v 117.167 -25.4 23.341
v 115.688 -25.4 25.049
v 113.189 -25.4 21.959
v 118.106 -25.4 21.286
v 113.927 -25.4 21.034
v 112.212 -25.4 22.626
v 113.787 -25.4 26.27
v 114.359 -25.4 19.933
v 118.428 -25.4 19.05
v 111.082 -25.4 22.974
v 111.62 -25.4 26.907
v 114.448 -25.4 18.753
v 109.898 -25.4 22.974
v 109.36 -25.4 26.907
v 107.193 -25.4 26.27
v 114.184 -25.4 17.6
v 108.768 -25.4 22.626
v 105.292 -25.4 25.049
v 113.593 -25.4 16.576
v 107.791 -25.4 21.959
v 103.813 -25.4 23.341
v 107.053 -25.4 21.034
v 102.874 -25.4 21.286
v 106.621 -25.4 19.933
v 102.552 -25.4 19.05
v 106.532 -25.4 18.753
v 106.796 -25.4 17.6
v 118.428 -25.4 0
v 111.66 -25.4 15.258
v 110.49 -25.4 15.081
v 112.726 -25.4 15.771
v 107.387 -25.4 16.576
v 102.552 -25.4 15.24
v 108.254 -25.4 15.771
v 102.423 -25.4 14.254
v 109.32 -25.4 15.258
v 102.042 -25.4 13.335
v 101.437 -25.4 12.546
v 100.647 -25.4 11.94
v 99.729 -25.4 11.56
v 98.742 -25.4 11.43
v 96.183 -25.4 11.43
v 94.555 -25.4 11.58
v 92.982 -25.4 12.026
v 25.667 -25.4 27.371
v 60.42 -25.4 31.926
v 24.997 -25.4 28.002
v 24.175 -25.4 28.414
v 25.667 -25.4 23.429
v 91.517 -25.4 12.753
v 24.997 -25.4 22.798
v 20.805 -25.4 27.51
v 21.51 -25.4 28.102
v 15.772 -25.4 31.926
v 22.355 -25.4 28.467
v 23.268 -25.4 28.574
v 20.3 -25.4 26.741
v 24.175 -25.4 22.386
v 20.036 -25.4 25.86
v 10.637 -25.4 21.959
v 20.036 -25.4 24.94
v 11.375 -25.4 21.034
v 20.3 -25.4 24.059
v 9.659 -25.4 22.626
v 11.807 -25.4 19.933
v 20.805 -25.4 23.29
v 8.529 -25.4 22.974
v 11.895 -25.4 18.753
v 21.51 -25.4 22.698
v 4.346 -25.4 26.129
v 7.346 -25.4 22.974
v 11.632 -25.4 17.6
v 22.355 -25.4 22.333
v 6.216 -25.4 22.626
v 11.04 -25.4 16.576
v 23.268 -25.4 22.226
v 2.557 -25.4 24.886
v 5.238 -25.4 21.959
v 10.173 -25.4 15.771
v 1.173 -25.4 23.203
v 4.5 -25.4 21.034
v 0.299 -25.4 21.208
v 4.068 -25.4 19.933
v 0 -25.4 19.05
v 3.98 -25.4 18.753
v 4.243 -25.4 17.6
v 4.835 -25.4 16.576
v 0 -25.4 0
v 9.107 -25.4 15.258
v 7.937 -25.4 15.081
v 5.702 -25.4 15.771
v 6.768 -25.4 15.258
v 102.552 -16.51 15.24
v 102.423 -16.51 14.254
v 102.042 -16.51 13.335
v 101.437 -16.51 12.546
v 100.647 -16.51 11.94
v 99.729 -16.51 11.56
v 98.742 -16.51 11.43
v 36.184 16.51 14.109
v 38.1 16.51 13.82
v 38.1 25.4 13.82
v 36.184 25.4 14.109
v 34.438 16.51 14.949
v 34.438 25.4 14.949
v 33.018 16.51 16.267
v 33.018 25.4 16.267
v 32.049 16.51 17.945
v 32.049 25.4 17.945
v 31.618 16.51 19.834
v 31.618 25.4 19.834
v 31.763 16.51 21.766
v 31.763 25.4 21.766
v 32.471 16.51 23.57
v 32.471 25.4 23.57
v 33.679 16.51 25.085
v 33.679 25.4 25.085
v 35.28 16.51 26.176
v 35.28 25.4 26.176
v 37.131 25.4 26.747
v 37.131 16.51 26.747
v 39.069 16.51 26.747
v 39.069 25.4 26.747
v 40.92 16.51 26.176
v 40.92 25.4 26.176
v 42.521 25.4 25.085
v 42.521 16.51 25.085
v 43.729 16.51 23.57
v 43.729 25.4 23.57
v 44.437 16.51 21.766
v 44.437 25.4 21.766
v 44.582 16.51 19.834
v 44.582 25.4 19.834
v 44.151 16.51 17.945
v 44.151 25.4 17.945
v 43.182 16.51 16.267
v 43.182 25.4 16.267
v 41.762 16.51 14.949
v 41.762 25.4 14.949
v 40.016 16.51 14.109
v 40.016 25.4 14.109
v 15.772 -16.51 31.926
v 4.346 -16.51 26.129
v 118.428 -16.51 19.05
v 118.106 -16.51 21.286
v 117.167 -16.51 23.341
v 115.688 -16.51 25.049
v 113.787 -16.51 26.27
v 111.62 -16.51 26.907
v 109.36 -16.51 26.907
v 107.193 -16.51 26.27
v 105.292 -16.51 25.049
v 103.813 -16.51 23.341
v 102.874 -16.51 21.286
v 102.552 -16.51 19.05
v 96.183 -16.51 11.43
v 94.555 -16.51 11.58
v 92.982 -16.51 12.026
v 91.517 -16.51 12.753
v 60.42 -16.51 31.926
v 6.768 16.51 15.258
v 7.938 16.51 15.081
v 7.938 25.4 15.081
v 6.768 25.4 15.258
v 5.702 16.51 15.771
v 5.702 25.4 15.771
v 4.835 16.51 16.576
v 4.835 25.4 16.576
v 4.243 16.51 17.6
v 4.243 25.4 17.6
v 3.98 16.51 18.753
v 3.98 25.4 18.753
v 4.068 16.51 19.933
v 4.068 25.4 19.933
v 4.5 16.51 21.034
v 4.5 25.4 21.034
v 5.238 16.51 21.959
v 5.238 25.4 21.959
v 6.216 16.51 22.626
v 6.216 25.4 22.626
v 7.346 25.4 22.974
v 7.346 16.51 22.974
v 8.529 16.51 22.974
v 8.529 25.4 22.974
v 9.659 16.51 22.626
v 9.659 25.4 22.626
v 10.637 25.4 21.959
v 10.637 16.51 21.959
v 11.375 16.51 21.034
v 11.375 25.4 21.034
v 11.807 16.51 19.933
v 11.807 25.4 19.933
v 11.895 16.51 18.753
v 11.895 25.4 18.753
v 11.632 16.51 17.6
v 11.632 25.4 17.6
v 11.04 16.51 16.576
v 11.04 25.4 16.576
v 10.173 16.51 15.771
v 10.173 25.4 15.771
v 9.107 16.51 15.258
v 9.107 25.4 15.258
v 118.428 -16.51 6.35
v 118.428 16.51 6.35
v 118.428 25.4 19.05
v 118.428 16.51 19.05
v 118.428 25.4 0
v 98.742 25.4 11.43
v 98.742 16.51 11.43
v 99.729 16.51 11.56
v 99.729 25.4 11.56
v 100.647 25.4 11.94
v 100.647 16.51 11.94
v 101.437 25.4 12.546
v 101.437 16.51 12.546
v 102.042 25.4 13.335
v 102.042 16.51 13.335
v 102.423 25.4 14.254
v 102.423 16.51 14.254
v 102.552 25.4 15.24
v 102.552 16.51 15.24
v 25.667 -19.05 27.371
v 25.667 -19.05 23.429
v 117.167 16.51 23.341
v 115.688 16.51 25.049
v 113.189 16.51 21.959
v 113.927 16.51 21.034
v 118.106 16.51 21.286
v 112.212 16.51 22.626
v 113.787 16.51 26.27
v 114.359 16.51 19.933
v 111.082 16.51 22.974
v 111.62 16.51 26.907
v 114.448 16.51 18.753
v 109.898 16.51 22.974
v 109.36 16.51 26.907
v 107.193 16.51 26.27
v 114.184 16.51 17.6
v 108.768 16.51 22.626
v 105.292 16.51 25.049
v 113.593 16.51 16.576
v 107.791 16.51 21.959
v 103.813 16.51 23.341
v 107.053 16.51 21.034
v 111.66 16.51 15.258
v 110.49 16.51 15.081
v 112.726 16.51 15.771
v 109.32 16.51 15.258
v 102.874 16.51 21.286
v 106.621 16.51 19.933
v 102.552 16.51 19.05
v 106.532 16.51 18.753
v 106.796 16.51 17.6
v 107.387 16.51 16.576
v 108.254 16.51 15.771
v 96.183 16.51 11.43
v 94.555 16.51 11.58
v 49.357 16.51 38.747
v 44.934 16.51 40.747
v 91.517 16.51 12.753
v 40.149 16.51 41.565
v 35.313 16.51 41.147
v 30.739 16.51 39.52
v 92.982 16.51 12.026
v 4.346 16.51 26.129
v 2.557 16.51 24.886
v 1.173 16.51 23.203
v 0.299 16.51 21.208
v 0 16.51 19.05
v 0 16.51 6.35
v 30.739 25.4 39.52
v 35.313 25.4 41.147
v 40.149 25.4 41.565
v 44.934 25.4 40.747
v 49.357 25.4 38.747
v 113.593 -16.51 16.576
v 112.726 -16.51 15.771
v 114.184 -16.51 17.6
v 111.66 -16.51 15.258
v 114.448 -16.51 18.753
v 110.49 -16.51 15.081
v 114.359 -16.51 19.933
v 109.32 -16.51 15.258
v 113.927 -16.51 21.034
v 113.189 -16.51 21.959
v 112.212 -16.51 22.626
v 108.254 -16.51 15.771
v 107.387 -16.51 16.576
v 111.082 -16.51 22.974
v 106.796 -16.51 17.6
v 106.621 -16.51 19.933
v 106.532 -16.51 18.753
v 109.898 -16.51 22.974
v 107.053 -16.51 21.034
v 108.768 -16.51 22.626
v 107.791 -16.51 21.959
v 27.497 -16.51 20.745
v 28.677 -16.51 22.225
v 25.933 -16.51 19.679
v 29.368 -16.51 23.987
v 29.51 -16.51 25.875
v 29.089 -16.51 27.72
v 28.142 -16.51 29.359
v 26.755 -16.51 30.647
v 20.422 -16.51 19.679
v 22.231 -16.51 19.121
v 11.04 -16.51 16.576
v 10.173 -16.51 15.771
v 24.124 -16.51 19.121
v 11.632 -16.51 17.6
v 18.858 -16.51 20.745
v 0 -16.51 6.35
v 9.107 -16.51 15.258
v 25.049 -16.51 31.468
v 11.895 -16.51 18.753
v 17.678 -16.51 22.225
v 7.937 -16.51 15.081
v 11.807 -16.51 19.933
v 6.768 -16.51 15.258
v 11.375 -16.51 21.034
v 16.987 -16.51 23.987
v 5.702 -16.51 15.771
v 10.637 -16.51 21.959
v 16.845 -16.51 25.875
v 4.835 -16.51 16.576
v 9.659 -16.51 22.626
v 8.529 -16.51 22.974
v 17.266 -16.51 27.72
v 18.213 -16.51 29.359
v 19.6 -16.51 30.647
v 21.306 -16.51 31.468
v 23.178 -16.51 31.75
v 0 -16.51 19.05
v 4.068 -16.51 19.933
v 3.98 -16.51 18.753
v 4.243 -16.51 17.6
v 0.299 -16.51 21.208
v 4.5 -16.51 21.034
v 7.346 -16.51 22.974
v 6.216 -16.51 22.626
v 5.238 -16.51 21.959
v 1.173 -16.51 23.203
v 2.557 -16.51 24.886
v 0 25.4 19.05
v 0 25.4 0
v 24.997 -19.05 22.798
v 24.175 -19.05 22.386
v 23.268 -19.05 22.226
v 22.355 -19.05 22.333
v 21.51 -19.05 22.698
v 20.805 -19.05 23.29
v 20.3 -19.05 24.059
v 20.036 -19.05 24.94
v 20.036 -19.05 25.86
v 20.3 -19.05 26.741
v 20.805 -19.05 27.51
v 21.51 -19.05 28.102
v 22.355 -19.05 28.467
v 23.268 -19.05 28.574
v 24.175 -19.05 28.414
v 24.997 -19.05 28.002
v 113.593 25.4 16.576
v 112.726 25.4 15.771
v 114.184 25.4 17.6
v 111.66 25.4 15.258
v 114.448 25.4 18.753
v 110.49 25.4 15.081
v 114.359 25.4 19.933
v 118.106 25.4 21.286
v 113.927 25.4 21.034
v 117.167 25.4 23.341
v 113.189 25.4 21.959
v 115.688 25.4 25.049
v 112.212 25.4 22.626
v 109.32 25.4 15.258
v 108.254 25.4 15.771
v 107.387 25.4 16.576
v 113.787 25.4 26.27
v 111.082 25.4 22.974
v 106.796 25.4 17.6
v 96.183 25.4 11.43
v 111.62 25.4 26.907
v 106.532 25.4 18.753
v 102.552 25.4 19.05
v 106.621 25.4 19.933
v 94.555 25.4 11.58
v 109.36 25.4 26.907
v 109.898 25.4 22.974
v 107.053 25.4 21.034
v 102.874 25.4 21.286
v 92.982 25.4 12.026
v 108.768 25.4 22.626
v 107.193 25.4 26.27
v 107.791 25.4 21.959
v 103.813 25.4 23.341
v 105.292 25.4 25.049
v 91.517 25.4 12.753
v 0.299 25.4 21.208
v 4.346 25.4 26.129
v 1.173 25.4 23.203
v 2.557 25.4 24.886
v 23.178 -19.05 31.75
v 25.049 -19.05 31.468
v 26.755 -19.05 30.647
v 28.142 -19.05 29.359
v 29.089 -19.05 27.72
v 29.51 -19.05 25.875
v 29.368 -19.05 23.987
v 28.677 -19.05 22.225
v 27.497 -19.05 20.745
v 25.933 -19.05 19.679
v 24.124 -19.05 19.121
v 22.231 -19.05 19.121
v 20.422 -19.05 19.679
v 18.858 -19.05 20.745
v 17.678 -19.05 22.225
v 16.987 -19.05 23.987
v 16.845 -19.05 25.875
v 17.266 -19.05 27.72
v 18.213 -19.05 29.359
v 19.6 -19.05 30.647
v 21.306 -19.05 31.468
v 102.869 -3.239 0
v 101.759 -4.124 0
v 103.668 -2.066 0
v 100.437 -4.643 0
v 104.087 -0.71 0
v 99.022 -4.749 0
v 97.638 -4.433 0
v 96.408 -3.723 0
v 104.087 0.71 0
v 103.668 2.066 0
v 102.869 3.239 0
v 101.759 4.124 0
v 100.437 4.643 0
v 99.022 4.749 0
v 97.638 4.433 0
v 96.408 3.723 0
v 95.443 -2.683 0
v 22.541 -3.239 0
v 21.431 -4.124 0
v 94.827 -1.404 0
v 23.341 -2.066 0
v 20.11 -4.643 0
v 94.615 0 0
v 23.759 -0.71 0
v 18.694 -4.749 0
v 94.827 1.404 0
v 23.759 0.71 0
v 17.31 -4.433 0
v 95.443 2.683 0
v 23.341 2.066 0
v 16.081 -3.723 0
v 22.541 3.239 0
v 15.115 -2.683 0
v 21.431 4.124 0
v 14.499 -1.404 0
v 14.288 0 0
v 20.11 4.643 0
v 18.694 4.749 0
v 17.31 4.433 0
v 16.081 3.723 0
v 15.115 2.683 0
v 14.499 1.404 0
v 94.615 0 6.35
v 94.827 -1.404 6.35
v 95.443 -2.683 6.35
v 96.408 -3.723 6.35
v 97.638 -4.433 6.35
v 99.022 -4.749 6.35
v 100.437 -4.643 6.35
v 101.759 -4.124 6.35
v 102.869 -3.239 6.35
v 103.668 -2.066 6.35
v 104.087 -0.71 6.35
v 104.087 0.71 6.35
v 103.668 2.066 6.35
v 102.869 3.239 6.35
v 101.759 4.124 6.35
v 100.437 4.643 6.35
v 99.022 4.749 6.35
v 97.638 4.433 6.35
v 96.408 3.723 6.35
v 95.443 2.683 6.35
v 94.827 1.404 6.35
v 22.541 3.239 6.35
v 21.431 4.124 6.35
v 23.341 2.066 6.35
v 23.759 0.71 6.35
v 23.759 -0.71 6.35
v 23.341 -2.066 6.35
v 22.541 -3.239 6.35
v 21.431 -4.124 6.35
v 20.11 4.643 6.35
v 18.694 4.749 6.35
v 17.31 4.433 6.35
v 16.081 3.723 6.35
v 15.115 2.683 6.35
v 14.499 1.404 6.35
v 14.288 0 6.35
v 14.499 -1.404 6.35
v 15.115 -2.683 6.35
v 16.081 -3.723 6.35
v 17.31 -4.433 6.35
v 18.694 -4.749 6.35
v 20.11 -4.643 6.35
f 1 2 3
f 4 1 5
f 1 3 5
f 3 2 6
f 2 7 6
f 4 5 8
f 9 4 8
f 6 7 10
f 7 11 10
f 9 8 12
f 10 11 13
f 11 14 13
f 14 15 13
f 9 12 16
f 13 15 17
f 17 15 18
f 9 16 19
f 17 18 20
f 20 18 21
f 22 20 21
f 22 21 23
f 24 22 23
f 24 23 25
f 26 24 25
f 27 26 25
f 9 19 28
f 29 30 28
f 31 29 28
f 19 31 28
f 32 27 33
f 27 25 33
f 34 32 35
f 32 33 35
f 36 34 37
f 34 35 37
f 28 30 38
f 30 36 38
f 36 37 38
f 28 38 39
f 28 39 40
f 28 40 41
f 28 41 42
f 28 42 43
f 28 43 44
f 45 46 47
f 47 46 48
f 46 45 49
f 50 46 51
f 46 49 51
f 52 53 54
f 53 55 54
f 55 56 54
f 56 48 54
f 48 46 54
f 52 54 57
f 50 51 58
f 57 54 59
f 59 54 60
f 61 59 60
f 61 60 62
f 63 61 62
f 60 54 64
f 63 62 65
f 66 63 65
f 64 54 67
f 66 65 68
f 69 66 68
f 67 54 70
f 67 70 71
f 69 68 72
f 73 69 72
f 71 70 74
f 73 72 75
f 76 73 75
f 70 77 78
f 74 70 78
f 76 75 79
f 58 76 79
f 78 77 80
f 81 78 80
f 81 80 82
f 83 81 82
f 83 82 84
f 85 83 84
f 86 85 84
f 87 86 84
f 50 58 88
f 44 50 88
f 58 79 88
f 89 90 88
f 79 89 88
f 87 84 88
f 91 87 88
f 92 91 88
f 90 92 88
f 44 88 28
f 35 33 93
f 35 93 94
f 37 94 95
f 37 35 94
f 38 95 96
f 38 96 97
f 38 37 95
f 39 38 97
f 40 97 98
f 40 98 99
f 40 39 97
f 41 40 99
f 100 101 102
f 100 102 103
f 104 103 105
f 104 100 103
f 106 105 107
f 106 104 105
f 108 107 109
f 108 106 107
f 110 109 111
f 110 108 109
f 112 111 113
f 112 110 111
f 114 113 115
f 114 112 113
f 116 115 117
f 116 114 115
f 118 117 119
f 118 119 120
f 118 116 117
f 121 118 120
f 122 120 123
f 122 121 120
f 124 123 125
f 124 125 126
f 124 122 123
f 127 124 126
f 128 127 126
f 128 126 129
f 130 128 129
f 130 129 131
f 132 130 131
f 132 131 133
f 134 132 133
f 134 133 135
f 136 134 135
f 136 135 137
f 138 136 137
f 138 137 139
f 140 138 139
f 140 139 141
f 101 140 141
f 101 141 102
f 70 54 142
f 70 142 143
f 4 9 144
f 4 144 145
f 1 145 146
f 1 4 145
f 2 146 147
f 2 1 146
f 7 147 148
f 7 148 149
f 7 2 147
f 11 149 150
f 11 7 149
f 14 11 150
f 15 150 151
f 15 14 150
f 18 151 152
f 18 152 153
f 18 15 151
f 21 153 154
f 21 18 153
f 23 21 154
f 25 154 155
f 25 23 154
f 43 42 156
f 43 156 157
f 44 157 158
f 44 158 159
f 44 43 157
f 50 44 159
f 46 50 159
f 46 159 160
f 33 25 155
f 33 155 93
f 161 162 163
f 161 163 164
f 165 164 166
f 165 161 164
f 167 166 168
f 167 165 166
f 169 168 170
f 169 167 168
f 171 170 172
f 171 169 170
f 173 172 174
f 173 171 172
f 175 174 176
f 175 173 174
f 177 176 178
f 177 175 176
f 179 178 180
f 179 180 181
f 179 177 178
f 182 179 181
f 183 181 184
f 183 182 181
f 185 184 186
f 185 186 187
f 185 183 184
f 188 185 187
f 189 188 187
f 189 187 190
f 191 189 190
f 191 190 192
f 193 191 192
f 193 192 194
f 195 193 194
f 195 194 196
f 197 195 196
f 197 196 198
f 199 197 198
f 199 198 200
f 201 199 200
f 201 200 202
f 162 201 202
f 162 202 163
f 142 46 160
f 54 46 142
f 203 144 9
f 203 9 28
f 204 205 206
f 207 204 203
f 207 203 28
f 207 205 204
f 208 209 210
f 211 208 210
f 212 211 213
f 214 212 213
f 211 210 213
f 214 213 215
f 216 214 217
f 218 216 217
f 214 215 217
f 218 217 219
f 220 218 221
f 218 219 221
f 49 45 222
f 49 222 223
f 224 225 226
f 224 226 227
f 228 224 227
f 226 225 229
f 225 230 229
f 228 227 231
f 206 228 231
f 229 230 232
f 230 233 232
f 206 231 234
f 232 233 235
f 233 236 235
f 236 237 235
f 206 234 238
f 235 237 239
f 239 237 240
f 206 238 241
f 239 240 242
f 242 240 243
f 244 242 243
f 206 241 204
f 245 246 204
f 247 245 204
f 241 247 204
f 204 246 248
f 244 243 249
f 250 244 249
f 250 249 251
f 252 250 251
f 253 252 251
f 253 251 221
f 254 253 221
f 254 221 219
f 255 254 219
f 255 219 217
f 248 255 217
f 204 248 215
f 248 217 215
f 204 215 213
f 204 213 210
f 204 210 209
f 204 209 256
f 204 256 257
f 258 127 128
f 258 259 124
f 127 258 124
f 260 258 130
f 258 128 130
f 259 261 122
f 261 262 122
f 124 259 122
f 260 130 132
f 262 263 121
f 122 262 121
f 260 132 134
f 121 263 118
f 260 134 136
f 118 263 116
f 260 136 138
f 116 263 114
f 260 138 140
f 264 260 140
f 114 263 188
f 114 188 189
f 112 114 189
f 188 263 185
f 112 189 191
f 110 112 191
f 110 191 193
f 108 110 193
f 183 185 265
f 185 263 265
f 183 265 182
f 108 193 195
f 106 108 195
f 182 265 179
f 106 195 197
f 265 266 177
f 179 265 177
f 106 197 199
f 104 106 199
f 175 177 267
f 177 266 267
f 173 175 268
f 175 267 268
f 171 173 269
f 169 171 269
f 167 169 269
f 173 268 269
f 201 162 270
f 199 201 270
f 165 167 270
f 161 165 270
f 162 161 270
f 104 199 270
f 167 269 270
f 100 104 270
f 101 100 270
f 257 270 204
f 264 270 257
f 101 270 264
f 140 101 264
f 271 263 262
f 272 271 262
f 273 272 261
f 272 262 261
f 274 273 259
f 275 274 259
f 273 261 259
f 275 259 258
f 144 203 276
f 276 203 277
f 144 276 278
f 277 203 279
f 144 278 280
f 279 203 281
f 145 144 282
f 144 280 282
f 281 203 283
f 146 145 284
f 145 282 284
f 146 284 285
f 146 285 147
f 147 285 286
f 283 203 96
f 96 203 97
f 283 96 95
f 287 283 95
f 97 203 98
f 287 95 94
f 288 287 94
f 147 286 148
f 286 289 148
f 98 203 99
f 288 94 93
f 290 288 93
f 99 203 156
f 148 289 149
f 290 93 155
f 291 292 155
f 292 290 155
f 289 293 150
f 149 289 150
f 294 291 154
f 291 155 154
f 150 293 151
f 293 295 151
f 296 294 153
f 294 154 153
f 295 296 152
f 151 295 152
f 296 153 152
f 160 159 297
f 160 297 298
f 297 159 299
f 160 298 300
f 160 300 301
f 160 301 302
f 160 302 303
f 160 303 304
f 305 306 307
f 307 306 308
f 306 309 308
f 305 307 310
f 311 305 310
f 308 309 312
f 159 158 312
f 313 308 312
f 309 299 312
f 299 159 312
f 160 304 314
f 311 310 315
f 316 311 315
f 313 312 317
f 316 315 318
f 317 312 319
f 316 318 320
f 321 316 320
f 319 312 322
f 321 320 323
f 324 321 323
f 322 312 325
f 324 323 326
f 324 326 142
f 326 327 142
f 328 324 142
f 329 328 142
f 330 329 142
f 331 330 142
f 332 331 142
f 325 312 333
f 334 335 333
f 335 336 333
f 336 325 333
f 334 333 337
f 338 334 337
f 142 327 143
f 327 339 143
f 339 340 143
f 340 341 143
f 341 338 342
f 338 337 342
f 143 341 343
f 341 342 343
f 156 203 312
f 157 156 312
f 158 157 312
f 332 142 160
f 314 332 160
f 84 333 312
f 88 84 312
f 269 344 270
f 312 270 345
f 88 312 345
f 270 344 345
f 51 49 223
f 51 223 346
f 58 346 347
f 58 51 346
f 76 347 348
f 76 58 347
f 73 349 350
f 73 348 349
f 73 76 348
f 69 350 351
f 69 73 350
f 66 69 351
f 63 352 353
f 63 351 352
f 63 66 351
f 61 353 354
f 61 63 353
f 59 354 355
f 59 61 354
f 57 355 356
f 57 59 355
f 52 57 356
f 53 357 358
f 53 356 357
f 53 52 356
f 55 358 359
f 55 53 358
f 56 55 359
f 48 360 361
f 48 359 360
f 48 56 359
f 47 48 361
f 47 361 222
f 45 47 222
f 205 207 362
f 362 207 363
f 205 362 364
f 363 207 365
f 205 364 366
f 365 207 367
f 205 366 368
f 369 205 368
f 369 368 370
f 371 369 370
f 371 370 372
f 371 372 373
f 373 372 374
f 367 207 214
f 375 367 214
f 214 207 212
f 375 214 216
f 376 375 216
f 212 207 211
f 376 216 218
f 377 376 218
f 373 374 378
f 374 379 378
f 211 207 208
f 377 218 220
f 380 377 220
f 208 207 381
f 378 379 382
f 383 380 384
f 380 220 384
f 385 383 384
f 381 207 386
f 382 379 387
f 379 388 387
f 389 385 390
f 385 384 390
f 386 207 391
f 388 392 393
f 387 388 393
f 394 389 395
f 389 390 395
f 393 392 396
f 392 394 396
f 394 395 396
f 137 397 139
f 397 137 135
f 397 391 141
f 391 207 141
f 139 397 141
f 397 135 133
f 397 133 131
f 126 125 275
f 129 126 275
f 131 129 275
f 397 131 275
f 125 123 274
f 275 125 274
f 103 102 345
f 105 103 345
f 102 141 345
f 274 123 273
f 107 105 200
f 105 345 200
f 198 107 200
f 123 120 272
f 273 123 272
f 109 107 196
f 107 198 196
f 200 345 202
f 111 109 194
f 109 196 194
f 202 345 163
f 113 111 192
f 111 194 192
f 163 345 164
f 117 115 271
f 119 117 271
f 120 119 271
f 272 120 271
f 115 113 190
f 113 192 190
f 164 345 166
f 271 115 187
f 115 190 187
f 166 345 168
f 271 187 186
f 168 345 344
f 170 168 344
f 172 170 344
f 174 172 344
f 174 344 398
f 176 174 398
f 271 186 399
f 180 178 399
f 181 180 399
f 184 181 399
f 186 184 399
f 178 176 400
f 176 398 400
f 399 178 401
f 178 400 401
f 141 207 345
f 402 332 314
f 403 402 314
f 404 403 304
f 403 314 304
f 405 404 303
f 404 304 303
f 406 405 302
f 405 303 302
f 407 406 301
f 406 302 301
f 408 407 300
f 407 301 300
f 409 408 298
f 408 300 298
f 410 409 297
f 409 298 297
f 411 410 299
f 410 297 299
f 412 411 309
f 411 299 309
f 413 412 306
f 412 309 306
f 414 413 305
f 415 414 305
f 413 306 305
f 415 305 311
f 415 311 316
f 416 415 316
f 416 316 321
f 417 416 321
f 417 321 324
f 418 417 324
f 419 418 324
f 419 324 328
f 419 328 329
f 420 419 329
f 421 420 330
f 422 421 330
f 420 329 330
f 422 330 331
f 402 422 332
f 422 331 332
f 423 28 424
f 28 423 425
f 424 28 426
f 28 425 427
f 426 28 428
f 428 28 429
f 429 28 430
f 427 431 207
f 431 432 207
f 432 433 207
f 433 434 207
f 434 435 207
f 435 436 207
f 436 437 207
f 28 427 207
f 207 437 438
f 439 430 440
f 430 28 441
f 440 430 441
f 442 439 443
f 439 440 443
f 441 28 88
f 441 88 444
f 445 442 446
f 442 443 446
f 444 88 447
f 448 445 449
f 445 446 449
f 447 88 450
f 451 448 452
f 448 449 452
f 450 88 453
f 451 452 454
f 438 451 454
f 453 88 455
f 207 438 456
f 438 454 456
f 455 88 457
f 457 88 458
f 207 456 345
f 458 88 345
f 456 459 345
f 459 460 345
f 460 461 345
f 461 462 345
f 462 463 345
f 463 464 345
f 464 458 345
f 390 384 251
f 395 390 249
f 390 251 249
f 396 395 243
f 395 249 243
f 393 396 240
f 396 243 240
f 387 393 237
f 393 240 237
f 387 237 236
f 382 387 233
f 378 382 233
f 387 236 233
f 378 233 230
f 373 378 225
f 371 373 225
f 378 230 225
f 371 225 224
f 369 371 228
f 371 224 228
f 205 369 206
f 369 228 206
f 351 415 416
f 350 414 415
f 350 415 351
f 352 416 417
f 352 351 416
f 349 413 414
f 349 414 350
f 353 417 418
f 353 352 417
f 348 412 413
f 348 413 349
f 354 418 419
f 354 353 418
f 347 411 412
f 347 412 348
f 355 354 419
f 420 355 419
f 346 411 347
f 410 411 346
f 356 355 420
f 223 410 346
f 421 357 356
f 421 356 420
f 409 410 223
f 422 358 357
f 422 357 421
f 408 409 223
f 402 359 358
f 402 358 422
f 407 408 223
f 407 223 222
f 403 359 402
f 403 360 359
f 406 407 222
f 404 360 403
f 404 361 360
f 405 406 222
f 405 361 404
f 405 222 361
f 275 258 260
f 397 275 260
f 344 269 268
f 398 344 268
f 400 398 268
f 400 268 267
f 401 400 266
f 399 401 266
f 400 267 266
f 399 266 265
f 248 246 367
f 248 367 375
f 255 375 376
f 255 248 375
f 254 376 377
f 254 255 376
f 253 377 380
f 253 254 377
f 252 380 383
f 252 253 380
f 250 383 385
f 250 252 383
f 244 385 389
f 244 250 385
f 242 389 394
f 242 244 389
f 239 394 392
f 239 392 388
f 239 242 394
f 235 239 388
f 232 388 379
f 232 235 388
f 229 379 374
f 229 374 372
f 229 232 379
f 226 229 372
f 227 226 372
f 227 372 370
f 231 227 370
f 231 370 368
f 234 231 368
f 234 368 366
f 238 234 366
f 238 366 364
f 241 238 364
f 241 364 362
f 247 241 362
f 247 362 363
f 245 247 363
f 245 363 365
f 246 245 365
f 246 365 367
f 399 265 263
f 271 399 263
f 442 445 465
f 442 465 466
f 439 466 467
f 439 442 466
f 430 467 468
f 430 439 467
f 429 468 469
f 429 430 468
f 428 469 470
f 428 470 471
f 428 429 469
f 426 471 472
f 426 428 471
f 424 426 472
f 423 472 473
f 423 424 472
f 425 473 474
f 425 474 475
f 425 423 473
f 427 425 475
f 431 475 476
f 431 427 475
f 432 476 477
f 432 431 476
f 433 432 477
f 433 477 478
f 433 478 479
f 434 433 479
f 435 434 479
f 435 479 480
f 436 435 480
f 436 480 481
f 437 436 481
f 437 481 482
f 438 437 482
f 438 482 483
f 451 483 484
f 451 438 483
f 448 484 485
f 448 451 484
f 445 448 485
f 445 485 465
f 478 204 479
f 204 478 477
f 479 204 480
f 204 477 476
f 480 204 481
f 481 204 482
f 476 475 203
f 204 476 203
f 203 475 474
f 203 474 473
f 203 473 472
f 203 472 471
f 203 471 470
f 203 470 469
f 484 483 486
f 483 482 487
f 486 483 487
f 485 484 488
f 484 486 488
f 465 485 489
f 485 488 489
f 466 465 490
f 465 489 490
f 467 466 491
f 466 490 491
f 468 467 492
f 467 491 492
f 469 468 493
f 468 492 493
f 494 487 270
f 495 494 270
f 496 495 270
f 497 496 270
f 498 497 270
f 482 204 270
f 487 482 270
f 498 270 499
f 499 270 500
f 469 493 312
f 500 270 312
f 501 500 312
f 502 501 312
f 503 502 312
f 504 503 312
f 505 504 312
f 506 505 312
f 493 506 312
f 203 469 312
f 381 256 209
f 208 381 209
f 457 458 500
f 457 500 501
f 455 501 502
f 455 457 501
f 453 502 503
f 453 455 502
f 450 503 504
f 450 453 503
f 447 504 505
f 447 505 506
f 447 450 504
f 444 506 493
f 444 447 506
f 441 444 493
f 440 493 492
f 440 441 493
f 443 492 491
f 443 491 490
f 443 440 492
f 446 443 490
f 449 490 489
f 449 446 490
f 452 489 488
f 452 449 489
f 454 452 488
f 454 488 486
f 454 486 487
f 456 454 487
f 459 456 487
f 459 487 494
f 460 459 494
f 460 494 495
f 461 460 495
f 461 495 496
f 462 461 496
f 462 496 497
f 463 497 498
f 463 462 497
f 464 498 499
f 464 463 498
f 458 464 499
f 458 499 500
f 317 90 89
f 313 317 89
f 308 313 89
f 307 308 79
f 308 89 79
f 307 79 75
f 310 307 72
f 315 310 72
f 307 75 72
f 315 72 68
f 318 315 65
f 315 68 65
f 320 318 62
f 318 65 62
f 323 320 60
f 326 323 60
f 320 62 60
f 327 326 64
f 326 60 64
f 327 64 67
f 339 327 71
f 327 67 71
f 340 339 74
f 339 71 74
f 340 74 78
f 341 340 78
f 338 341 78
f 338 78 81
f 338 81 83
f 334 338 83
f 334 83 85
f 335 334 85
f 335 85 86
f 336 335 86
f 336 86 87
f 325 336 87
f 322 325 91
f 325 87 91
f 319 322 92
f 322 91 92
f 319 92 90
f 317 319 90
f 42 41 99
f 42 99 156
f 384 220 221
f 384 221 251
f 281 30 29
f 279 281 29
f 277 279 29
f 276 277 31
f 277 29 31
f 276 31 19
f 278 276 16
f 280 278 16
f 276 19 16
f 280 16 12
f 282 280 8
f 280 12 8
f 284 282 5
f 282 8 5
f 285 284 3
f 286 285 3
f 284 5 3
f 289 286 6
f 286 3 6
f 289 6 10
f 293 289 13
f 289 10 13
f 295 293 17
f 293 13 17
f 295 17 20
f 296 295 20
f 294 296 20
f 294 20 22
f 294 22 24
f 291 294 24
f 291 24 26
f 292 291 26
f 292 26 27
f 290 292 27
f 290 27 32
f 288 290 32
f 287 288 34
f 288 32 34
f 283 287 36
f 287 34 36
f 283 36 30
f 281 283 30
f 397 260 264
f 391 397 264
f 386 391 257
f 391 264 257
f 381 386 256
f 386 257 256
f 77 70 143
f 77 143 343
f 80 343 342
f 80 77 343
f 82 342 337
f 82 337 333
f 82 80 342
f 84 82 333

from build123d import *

# Parameters (mm, degrees)
BOSS_EXTRUDE1_DEPTH = 118.4275
SKETCH3_R           = 3.96875
SKETCH3_R_2         = 6.5
CUT_EXTRUDE1_DEPTH  = 25.4
SKETCH6_R           = 3.96875
CUT_EXTRUDE3_DEPTH  = 8.89
SKETCH4_R           = 4.7625
CUT_EXTRUDE2_DEPTH  = 6.35
SKETCH7_R           = 6.35
CUT_EXTRUDE4_DEPTH  = 2.54


with BuildPart() as part:
    # Sketch2 → Boss-Extrude1 (new body)
    with BuildSketch(Plane(origin=(0, 0, 0), x_dir=(0, 0, -1), z_dir=(1, 0, 0))):
        Polygon((0, -25.4), (0, 25.4), (-63.5, 25.4), (-63.5, 16.51), (-6.35, 16.51), (-6.35, -16.51), (-63.5, -16.51), (-63.5, -25.4), align=None)
    extrude(amount=BOSS_EXTRUDE1_DEPTH)

    # Sketch3 → Cut-Extrude1 (cut)
    with BuildSketch(Plane(origin=(0, 0, 0), x_dir=(1, 0, 0), z_dir=(0, 1, 0))):
        with Locations(Location((7.9375, -19.05, 0), (0, 0, 90))):
            Circle(SKETCH3_R)
        with Locations(Location((110.49, -19.05, 0), (0, 0, 90))):
            Circle(SKETCH3_R)
        with Locations(Location((38.1, -20.32, 0), (0, 0, 90))):
            Circle(SKETCH3_R_2)
        with BuildLine():
            Line((0, -63.5), (0, -19.05))
            ThreePointArc((0, -19.05), (1.173211717, -23.203108508), (4.346030936, -26.128506637))
            Line((4.346030936, -26.128506637), (30.73922523, -39.519797436))
            ThreePointArc((30.73922523, -39.519797436), (40.148824549, -41.564990827), (49.356556182, -38.747003333))
            Line((49.356556182, -38.747003333), (91.51717293, -12.752709815))
            ThreePointArc((91.51717293, -12.752709815), (93.758058641, -11.767067469), (96.182815356, -11.43))
            Line((96.182815356, -11.43), (98.7425, -11.43))
            ThreePointArc((98.7425, -11.43), (101.436576836, -12.545923164), (102.5525, -15.24))
            Line((102.5525, -15.24), (102.5525, -19.05))
            ThreePointArc((102.5525, -19.05), (110.49, -26.9875), (118.4275, -19.05))
            Line((118.4275, -19.05), (118.4275, -63.5))
            Line((118.4275, -63.5), (0, -63.5))
        make_face()
    extrude(amount=CUT_EXTRUDE1_DEPTH, mode=Mode.SUBTRACT)

    # Sketch6 → Cut-Extrude3 (cut)
    with BuildSketch(Plane.XZ.offset(25.4)):
        with Locations(Location((110.49, 19.05, 0), (0, 0, 270))):
            Circle(SKETCH6_R)
        with Locations(Location((7.9375, 19.05, 0), (0, 0, 270))):
            Circle(SKETCH6_R)
        with BuildLine():
            Line((0, 19.05), (0, 63.5))
            Line((0, 63.5), (118.4275, 63.5))
            Line((118.4275, 63.5), (118.4275, 19.05))
            ThreePointArc((118.4275, 19.05), (110.49, 26.9875), (102.5525, 19.05))
            Line((102.5525, 19.05), (102.5525, 15.24))
            ThreePointArc((102.5525, 15.24), (101.436576836, 12.545923164), (98.7425, 11.43))
            Line((98.7425, 11.43), (96.182815356, 11.43))
            ThreePointArc((96.182815356, 11.43), (93.758058641, 11.767067469), (91.51717293, 12.752709815))
            Line((91.51717293, 12.752709815), (60.419932998, 31.92583499))
            Line((60.419932998, 31.92583499), (15.772114941, 31.92583499))
            Line((15.772114941, 31.92583499), (4.346030936, 26.128506637))
            ThreePointArc((4.346030936, 26.128506637), (1.173211717, 23.203108508), (0, 19.05))
        make_face()
        with BuildLine():
            Line((25.6667, 27.370915615), (25.6667, 23.429084385))
            ThreePointArc((25.6667, 23.429084385), (20.0025, 25.4), (25.6667, 27.370915615))
        make_face()
    extrude(amount=-CUT_EXTRUDE3_DEPTH, mode=Mode.SUBTRACT)

    # Sketch4 → Cut-Extrude2 (cut)
    with BuildSketch(Plane.XY):
        with Locations(Location((19.05, 0, 0), (0, 0, 180))):
            Circle(SKETCH4_R)
        with Locations(Location((99.3775, 0, 0), (0, 0, 180))):
            Circle(SKETCH4_R)
    extrude(amount=CUT_EXTRUDE2_DEPTH, mode=Mode.SUBTRACT)

    # Sketch7 → Cut-Extrude4 (cut)
    with BuildSketch(Plane(origin=(0, -16.51, 0), x_dir=(1, 0, 0), z_dir=(0, 1, 0))):
        with Locations(Location((23.1775, -25.4, 0), (0, 0, 270))):
            Circle(SKETCH7_R)
    extrude(amount=-CUT_EXTRUDE4_DEPTH, mode=Mode.SUBTRACT)


solid = part.part
